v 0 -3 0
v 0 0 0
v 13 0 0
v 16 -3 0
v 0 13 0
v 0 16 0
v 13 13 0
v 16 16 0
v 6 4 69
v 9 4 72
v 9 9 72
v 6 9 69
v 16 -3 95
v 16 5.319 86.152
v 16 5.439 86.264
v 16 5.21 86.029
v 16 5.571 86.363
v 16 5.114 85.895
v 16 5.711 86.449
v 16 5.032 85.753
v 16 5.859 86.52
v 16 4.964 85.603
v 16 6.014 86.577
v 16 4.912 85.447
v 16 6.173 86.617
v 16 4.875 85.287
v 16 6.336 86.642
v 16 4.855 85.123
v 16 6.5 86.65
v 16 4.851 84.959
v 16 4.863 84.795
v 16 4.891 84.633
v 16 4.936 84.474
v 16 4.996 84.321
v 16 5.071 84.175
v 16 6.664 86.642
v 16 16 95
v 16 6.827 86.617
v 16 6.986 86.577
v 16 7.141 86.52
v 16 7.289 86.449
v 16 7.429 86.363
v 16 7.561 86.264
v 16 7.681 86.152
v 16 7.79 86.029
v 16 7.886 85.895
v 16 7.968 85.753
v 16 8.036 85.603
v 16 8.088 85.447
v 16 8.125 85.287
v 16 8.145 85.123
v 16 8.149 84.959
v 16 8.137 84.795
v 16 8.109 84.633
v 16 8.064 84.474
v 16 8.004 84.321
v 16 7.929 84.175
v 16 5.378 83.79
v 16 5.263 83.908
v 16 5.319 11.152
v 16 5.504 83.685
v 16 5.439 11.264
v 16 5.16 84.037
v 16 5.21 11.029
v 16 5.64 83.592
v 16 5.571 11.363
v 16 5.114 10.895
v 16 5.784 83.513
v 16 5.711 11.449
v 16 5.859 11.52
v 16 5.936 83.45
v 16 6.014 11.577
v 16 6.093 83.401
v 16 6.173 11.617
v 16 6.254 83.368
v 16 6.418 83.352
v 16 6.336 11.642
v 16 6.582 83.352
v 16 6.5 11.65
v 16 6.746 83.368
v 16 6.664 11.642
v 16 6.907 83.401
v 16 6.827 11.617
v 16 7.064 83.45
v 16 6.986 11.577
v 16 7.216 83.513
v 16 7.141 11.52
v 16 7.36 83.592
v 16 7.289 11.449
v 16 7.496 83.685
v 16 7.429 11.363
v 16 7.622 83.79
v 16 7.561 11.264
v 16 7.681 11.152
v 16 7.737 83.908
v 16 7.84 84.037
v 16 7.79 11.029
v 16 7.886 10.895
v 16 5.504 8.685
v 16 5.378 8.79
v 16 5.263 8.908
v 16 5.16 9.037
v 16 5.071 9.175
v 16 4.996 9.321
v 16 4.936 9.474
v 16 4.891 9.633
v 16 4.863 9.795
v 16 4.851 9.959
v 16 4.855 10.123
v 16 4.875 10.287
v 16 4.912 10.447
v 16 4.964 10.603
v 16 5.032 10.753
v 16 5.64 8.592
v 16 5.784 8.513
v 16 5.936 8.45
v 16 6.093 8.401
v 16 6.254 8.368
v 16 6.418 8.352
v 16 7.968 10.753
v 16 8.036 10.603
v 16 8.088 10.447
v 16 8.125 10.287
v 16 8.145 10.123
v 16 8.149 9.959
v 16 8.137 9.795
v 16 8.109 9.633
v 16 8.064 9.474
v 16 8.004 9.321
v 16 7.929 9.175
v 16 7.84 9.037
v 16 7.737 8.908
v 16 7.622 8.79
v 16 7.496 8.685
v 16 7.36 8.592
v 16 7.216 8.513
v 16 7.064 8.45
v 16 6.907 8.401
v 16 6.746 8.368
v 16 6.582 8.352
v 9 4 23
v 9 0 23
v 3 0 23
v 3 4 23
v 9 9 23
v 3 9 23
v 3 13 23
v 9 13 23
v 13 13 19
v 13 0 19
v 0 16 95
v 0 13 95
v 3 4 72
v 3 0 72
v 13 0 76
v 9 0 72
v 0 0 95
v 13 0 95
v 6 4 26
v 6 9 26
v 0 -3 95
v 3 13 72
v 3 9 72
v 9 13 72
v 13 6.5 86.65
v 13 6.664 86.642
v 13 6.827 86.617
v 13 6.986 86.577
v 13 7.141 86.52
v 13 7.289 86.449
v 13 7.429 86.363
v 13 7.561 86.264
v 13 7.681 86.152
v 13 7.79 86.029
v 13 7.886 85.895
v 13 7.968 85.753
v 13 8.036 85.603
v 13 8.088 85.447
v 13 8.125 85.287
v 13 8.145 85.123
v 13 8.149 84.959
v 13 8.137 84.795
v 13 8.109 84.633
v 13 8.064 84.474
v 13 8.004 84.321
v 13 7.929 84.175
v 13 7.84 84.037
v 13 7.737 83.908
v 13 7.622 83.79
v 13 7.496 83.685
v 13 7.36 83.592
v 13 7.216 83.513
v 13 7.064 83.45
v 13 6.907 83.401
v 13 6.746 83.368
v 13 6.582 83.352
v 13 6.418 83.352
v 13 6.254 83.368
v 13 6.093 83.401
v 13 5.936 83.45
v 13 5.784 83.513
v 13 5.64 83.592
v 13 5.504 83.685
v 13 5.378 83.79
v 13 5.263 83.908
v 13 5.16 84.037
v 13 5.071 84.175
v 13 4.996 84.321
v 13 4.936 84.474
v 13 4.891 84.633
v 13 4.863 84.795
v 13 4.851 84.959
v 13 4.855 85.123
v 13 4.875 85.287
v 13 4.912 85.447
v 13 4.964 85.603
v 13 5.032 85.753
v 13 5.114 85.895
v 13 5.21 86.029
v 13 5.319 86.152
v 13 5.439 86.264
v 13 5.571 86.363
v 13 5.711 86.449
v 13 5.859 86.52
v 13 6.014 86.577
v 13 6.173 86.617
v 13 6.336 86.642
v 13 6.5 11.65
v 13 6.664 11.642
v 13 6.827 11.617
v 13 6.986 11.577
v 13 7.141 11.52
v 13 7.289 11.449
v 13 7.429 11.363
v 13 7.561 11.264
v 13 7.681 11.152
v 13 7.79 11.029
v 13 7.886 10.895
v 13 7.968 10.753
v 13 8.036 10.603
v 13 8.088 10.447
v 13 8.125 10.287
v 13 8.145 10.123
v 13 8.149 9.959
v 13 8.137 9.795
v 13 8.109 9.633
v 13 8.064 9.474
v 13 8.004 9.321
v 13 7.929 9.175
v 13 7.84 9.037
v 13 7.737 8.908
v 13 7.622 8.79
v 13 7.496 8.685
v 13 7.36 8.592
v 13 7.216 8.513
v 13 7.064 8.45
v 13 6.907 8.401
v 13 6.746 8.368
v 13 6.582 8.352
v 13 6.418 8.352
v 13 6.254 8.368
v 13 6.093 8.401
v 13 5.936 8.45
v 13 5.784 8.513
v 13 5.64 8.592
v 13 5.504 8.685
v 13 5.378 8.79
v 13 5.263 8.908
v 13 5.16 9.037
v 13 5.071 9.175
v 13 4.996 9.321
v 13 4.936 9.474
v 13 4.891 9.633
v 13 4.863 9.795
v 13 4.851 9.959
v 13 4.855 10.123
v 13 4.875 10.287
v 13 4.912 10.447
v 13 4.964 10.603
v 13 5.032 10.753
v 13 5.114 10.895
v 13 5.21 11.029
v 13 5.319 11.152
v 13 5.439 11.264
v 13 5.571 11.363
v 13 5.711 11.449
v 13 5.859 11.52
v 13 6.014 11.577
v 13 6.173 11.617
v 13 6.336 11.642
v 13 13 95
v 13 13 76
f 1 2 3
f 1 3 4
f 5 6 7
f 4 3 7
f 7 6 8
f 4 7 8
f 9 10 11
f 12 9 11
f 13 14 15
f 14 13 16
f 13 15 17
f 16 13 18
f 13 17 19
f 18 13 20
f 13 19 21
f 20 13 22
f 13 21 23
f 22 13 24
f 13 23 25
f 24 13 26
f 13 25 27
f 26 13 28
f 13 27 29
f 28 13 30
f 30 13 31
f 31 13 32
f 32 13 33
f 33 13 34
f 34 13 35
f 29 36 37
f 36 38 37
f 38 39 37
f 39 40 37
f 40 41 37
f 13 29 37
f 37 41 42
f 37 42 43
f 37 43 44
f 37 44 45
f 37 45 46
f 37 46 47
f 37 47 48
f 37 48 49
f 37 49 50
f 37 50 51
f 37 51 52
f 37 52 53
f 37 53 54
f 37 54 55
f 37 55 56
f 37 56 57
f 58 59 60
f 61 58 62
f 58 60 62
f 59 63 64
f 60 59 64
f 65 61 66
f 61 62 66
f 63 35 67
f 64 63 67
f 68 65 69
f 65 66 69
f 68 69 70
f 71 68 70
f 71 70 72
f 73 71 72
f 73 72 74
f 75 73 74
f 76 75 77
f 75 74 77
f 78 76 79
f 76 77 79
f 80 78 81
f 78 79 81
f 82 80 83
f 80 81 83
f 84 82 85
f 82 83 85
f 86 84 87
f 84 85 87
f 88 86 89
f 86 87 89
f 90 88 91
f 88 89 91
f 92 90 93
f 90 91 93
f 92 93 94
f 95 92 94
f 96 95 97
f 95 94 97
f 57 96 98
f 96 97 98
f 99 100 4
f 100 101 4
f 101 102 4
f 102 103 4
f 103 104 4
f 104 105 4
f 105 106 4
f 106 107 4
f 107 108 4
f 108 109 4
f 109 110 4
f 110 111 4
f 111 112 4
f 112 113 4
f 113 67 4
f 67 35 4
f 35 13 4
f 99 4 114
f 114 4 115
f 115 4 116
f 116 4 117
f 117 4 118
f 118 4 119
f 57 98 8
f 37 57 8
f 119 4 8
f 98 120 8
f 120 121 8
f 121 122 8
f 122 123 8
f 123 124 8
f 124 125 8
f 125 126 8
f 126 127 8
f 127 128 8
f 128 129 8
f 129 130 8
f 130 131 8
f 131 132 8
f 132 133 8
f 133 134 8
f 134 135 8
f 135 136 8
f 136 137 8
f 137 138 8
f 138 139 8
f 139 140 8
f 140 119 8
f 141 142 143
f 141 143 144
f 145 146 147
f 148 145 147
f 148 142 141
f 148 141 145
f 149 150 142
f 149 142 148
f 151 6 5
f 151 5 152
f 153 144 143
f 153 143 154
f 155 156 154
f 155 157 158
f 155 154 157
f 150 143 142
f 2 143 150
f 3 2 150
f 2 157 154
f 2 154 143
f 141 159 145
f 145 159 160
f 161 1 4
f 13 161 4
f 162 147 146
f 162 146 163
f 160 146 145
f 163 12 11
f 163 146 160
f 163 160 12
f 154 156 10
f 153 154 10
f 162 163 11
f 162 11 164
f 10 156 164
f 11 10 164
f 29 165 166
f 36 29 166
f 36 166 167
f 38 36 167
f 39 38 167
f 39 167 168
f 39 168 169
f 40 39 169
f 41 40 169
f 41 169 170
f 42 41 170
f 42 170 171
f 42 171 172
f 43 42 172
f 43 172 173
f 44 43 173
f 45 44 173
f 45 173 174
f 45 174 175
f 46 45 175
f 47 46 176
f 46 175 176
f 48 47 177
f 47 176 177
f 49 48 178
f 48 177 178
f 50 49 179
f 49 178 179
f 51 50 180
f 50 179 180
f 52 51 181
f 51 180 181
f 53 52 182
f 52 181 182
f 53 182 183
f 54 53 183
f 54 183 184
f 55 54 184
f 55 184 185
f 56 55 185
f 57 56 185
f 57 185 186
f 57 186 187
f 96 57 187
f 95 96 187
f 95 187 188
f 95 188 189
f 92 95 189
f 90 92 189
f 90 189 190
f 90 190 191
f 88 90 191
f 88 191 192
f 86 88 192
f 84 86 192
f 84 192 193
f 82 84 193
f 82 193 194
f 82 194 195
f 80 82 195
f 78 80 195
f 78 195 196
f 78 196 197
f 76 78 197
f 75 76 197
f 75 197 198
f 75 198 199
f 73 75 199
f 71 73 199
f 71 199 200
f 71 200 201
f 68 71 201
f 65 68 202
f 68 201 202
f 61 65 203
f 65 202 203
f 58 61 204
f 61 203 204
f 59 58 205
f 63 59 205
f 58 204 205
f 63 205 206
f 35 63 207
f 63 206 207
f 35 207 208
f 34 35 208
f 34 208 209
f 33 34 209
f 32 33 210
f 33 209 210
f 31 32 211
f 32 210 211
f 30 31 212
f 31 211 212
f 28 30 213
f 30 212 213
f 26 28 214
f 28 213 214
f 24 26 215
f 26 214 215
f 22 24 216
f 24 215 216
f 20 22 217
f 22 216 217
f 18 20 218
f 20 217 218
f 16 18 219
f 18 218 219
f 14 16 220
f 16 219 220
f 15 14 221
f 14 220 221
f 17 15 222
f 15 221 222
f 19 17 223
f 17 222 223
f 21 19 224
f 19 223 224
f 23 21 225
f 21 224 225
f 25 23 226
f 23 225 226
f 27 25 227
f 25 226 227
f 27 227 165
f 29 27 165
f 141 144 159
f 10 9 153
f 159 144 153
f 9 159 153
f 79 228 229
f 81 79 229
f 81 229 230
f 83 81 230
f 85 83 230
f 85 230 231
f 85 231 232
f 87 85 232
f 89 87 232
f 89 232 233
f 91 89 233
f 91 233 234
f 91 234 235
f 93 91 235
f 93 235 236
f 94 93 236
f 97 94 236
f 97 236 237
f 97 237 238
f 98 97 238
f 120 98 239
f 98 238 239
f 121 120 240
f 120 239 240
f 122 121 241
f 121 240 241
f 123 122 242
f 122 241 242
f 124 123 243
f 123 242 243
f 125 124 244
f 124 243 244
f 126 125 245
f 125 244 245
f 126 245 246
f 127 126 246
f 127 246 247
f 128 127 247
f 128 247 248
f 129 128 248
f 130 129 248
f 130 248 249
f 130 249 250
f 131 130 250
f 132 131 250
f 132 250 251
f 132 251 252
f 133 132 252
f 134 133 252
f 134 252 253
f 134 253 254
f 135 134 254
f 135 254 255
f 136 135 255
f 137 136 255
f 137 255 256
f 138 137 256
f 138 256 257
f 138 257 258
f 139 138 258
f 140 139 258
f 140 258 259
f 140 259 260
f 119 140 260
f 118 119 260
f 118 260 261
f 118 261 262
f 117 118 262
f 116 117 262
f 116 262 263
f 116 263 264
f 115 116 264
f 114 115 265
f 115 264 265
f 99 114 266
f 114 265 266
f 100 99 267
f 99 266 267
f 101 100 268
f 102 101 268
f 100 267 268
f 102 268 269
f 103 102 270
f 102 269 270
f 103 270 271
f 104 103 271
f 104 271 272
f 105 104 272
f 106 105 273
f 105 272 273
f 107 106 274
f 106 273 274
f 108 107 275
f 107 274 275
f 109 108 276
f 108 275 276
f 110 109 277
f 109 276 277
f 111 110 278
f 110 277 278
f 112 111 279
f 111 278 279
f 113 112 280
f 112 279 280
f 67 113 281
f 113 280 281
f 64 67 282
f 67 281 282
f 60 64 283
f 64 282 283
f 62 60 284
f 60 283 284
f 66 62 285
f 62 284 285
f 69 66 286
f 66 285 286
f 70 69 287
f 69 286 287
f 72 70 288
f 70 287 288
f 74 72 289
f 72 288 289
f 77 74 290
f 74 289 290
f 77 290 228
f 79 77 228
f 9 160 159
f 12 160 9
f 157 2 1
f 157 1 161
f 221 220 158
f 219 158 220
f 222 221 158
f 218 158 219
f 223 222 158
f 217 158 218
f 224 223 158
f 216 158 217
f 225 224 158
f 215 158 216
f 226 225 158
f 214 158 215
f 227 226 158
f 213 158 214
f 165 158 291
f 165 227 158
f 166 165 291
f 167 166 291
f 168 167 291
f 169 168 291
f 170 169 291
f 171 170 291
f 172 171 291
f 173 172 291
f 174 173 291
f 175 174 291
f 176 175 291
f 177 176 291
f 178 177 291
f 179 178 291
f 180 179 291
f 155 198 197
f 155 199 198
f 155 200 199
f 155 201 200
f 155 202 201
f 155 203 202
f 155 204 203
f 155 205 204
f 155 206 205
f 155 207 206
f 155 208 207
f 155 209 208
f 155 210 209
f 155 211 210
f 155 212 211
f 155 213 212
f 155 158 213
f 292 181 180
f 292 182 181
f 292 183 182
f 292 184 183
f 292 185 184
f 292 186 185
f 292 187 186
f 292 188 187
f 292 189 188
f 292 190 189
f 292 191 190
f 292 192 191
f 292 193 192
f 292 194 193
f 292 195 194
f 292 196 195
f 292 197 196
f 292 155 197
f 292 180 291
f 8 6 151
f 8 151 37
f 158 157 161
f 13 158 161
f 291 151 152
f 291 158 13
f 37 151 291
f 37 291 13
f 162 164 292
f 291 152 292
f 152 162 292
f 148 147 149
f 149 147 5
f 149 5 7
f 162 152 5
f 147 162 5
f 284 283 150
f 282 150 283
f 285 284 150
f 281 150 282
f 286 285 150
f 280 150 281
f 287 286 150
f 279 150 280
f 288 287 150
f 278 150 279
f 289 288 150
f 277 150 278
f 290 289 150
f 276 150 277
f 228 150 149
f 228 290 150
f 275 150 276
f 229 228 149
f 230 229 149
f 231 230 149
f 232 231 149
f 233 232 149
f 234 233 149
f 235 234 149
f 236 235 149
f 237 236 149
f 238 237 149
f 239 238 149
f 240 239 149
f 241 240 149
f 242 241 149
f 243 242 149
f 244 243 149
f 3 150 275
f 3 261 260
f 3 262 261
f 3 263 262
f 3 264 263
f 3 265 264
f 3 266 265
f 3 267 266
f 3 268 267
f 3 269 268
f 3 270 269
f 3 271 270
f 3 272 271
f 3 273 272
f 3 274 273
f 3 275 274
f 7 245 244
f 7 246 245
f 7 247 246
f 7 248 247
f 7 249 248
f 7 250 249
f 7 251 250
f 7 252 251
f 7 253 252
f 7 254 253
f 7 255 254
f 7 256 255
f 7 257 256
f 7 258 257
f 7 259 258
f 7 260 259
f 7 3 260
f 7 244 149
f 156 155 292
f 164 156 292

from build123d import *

# Parameters (mm, degrees)
SKETCH_1_W          = 19
SKETCH_1_H          = 19
SKETCH_1_W_2        = 13
SKETCH_1_H_2        = 13
EXTRUDE_1_DEPTH     = 95
SKETCH_2_R          = 1.65
CUT_EXTRUDE_1_DEPTH = 30
SKETCH_3_W          = 116.915177823
SKETCH_3_H          = 46.219516436
CUT_EXTRUDE_2_DEPTH = 3
SKETCH_4_W          = 5
SKETCH_4_H          = 13
EXTRUDE_1_2_DEPTH   = 10
SKETCH_5_W          = 39
SKETCH_5_H          = 5
EXTRUDE_2_DEPTH     = 10
SKETCH_6_W          = 49
SKETCH_6_H          = 13
EXTRUDE_3_DEPTH     = 10
SKETCH_8_W          = 49
SKETCH_8_H          = 5
CUT_EXTRUDE_3_DEPTH = 3
CHAMFER_1_SIZE      = 3
CHAMFER_2_SIZE      = 4


with BuildPart() as part:
    # 草图1 → Extrude 1 (new body)
    with BuildSketch(Plane.XY):
        with Locations((6.5, 6.5)):
            Rectangle(SKETCH_1_W, SKETCH_1_H)
        with Locations((6.5, 6.5)):
            Rectangle(SKETCH_1_W_2, SKETCH_1_H_2, mode=Mode.SUBTRACT)
    extrude(amount=EXTRUDE_1_DEPTH)

    # 草图2 → 切除-拉伸1 (cut)
    with BuildSketch(Plane.ZY.offset(3)):
        with Locations((10, 6.5)):
            Circle(SKETCH_2_R)
        with Locations((85, 6.5)):
            Circle(SKETCH_2_R)
    extrude(amount=-CUT_EXTRUDE_1_DEPTH, mode=Mode.SUBTRACT)

    # 草图3 → 切除-拉伸2 (cut)
    with BuildSketch(Plane.ZY.offset(3)):
        with Locations((53.162237228, 0.202739406)):
            Rectangle(SKETCH_3_W, SKETCH_3_H)
    extrude(amount=-CUT_EXTRUDE_2_DEPTH, mode=Mode.SUBTRACT)

    # 草图4 → Extrude 1 2 (add)
    with BuildSketch(Plane.ZY.offset(-13)):
        with Locations((25.5, 6.5)):
            Rectangle(SKETCH_4_W, SKETCH_4_H)
        with Locations((69.5, 6.5)):
            Rectangle(SKETCH_4_W, SKETCH_4_H)
    extrude(amount=EXTRUDE_1_2_DEPTH)

    # 草图5 → 凸台-拉伸2 (add)
    with BuildSketch(Plane.ZY.offset(-13)):
        with Locations((47.5, 6.5)):
            Rectangle(SKETCH_5_W, SKETCH_5_H)
    extrude(amount=EXTRUDE_2_DEPTH)

    # 草图6 → 凸台-拉伸3 (add)
    with BuildSketch(Plane.ZY.offset(-13)):
        with Locations((47.5, 6.5)):
            Rectangle(SKETCH_6_W, SKETCH_6_H)
    extrude(amount=EXTRUDE_3_DEPTH)

    # 草图8 → 切除-拉伸3 (cut)
    with BuildSketch(Plane.ZY.offset(-3)):
        with Locations((47.5, 6.5)):
            Rectangle(SKETCH_8_W, SKETCH_8_H)
    extrude(amount=-CUT_EXTRUDE_3_DEPTH, mode=Mode.SUBTRACT)

    # 倒角1
    chamfer_1_edges = [part.edges().sort_by_distance(p)[0] for p in [
        (6, 6.5, 23),
        (6, 6.5, 72),
    ]]
    chamfer(chamfer_1_edges, length=CHAMFER_1_SIZE)

    # 倒角2
    chamfer_2_edges = [part.edges().sort_by_distance(p)[0] for p in [
        (13, 6.5, 23),
        (13, 6.5, 72),
    ]]
    chamfer(chamfer_2_edges, length=CHAMFER_2_SIZE - 0.0001)  # a hair under: the kernel refuses the full size


solid = part.part
